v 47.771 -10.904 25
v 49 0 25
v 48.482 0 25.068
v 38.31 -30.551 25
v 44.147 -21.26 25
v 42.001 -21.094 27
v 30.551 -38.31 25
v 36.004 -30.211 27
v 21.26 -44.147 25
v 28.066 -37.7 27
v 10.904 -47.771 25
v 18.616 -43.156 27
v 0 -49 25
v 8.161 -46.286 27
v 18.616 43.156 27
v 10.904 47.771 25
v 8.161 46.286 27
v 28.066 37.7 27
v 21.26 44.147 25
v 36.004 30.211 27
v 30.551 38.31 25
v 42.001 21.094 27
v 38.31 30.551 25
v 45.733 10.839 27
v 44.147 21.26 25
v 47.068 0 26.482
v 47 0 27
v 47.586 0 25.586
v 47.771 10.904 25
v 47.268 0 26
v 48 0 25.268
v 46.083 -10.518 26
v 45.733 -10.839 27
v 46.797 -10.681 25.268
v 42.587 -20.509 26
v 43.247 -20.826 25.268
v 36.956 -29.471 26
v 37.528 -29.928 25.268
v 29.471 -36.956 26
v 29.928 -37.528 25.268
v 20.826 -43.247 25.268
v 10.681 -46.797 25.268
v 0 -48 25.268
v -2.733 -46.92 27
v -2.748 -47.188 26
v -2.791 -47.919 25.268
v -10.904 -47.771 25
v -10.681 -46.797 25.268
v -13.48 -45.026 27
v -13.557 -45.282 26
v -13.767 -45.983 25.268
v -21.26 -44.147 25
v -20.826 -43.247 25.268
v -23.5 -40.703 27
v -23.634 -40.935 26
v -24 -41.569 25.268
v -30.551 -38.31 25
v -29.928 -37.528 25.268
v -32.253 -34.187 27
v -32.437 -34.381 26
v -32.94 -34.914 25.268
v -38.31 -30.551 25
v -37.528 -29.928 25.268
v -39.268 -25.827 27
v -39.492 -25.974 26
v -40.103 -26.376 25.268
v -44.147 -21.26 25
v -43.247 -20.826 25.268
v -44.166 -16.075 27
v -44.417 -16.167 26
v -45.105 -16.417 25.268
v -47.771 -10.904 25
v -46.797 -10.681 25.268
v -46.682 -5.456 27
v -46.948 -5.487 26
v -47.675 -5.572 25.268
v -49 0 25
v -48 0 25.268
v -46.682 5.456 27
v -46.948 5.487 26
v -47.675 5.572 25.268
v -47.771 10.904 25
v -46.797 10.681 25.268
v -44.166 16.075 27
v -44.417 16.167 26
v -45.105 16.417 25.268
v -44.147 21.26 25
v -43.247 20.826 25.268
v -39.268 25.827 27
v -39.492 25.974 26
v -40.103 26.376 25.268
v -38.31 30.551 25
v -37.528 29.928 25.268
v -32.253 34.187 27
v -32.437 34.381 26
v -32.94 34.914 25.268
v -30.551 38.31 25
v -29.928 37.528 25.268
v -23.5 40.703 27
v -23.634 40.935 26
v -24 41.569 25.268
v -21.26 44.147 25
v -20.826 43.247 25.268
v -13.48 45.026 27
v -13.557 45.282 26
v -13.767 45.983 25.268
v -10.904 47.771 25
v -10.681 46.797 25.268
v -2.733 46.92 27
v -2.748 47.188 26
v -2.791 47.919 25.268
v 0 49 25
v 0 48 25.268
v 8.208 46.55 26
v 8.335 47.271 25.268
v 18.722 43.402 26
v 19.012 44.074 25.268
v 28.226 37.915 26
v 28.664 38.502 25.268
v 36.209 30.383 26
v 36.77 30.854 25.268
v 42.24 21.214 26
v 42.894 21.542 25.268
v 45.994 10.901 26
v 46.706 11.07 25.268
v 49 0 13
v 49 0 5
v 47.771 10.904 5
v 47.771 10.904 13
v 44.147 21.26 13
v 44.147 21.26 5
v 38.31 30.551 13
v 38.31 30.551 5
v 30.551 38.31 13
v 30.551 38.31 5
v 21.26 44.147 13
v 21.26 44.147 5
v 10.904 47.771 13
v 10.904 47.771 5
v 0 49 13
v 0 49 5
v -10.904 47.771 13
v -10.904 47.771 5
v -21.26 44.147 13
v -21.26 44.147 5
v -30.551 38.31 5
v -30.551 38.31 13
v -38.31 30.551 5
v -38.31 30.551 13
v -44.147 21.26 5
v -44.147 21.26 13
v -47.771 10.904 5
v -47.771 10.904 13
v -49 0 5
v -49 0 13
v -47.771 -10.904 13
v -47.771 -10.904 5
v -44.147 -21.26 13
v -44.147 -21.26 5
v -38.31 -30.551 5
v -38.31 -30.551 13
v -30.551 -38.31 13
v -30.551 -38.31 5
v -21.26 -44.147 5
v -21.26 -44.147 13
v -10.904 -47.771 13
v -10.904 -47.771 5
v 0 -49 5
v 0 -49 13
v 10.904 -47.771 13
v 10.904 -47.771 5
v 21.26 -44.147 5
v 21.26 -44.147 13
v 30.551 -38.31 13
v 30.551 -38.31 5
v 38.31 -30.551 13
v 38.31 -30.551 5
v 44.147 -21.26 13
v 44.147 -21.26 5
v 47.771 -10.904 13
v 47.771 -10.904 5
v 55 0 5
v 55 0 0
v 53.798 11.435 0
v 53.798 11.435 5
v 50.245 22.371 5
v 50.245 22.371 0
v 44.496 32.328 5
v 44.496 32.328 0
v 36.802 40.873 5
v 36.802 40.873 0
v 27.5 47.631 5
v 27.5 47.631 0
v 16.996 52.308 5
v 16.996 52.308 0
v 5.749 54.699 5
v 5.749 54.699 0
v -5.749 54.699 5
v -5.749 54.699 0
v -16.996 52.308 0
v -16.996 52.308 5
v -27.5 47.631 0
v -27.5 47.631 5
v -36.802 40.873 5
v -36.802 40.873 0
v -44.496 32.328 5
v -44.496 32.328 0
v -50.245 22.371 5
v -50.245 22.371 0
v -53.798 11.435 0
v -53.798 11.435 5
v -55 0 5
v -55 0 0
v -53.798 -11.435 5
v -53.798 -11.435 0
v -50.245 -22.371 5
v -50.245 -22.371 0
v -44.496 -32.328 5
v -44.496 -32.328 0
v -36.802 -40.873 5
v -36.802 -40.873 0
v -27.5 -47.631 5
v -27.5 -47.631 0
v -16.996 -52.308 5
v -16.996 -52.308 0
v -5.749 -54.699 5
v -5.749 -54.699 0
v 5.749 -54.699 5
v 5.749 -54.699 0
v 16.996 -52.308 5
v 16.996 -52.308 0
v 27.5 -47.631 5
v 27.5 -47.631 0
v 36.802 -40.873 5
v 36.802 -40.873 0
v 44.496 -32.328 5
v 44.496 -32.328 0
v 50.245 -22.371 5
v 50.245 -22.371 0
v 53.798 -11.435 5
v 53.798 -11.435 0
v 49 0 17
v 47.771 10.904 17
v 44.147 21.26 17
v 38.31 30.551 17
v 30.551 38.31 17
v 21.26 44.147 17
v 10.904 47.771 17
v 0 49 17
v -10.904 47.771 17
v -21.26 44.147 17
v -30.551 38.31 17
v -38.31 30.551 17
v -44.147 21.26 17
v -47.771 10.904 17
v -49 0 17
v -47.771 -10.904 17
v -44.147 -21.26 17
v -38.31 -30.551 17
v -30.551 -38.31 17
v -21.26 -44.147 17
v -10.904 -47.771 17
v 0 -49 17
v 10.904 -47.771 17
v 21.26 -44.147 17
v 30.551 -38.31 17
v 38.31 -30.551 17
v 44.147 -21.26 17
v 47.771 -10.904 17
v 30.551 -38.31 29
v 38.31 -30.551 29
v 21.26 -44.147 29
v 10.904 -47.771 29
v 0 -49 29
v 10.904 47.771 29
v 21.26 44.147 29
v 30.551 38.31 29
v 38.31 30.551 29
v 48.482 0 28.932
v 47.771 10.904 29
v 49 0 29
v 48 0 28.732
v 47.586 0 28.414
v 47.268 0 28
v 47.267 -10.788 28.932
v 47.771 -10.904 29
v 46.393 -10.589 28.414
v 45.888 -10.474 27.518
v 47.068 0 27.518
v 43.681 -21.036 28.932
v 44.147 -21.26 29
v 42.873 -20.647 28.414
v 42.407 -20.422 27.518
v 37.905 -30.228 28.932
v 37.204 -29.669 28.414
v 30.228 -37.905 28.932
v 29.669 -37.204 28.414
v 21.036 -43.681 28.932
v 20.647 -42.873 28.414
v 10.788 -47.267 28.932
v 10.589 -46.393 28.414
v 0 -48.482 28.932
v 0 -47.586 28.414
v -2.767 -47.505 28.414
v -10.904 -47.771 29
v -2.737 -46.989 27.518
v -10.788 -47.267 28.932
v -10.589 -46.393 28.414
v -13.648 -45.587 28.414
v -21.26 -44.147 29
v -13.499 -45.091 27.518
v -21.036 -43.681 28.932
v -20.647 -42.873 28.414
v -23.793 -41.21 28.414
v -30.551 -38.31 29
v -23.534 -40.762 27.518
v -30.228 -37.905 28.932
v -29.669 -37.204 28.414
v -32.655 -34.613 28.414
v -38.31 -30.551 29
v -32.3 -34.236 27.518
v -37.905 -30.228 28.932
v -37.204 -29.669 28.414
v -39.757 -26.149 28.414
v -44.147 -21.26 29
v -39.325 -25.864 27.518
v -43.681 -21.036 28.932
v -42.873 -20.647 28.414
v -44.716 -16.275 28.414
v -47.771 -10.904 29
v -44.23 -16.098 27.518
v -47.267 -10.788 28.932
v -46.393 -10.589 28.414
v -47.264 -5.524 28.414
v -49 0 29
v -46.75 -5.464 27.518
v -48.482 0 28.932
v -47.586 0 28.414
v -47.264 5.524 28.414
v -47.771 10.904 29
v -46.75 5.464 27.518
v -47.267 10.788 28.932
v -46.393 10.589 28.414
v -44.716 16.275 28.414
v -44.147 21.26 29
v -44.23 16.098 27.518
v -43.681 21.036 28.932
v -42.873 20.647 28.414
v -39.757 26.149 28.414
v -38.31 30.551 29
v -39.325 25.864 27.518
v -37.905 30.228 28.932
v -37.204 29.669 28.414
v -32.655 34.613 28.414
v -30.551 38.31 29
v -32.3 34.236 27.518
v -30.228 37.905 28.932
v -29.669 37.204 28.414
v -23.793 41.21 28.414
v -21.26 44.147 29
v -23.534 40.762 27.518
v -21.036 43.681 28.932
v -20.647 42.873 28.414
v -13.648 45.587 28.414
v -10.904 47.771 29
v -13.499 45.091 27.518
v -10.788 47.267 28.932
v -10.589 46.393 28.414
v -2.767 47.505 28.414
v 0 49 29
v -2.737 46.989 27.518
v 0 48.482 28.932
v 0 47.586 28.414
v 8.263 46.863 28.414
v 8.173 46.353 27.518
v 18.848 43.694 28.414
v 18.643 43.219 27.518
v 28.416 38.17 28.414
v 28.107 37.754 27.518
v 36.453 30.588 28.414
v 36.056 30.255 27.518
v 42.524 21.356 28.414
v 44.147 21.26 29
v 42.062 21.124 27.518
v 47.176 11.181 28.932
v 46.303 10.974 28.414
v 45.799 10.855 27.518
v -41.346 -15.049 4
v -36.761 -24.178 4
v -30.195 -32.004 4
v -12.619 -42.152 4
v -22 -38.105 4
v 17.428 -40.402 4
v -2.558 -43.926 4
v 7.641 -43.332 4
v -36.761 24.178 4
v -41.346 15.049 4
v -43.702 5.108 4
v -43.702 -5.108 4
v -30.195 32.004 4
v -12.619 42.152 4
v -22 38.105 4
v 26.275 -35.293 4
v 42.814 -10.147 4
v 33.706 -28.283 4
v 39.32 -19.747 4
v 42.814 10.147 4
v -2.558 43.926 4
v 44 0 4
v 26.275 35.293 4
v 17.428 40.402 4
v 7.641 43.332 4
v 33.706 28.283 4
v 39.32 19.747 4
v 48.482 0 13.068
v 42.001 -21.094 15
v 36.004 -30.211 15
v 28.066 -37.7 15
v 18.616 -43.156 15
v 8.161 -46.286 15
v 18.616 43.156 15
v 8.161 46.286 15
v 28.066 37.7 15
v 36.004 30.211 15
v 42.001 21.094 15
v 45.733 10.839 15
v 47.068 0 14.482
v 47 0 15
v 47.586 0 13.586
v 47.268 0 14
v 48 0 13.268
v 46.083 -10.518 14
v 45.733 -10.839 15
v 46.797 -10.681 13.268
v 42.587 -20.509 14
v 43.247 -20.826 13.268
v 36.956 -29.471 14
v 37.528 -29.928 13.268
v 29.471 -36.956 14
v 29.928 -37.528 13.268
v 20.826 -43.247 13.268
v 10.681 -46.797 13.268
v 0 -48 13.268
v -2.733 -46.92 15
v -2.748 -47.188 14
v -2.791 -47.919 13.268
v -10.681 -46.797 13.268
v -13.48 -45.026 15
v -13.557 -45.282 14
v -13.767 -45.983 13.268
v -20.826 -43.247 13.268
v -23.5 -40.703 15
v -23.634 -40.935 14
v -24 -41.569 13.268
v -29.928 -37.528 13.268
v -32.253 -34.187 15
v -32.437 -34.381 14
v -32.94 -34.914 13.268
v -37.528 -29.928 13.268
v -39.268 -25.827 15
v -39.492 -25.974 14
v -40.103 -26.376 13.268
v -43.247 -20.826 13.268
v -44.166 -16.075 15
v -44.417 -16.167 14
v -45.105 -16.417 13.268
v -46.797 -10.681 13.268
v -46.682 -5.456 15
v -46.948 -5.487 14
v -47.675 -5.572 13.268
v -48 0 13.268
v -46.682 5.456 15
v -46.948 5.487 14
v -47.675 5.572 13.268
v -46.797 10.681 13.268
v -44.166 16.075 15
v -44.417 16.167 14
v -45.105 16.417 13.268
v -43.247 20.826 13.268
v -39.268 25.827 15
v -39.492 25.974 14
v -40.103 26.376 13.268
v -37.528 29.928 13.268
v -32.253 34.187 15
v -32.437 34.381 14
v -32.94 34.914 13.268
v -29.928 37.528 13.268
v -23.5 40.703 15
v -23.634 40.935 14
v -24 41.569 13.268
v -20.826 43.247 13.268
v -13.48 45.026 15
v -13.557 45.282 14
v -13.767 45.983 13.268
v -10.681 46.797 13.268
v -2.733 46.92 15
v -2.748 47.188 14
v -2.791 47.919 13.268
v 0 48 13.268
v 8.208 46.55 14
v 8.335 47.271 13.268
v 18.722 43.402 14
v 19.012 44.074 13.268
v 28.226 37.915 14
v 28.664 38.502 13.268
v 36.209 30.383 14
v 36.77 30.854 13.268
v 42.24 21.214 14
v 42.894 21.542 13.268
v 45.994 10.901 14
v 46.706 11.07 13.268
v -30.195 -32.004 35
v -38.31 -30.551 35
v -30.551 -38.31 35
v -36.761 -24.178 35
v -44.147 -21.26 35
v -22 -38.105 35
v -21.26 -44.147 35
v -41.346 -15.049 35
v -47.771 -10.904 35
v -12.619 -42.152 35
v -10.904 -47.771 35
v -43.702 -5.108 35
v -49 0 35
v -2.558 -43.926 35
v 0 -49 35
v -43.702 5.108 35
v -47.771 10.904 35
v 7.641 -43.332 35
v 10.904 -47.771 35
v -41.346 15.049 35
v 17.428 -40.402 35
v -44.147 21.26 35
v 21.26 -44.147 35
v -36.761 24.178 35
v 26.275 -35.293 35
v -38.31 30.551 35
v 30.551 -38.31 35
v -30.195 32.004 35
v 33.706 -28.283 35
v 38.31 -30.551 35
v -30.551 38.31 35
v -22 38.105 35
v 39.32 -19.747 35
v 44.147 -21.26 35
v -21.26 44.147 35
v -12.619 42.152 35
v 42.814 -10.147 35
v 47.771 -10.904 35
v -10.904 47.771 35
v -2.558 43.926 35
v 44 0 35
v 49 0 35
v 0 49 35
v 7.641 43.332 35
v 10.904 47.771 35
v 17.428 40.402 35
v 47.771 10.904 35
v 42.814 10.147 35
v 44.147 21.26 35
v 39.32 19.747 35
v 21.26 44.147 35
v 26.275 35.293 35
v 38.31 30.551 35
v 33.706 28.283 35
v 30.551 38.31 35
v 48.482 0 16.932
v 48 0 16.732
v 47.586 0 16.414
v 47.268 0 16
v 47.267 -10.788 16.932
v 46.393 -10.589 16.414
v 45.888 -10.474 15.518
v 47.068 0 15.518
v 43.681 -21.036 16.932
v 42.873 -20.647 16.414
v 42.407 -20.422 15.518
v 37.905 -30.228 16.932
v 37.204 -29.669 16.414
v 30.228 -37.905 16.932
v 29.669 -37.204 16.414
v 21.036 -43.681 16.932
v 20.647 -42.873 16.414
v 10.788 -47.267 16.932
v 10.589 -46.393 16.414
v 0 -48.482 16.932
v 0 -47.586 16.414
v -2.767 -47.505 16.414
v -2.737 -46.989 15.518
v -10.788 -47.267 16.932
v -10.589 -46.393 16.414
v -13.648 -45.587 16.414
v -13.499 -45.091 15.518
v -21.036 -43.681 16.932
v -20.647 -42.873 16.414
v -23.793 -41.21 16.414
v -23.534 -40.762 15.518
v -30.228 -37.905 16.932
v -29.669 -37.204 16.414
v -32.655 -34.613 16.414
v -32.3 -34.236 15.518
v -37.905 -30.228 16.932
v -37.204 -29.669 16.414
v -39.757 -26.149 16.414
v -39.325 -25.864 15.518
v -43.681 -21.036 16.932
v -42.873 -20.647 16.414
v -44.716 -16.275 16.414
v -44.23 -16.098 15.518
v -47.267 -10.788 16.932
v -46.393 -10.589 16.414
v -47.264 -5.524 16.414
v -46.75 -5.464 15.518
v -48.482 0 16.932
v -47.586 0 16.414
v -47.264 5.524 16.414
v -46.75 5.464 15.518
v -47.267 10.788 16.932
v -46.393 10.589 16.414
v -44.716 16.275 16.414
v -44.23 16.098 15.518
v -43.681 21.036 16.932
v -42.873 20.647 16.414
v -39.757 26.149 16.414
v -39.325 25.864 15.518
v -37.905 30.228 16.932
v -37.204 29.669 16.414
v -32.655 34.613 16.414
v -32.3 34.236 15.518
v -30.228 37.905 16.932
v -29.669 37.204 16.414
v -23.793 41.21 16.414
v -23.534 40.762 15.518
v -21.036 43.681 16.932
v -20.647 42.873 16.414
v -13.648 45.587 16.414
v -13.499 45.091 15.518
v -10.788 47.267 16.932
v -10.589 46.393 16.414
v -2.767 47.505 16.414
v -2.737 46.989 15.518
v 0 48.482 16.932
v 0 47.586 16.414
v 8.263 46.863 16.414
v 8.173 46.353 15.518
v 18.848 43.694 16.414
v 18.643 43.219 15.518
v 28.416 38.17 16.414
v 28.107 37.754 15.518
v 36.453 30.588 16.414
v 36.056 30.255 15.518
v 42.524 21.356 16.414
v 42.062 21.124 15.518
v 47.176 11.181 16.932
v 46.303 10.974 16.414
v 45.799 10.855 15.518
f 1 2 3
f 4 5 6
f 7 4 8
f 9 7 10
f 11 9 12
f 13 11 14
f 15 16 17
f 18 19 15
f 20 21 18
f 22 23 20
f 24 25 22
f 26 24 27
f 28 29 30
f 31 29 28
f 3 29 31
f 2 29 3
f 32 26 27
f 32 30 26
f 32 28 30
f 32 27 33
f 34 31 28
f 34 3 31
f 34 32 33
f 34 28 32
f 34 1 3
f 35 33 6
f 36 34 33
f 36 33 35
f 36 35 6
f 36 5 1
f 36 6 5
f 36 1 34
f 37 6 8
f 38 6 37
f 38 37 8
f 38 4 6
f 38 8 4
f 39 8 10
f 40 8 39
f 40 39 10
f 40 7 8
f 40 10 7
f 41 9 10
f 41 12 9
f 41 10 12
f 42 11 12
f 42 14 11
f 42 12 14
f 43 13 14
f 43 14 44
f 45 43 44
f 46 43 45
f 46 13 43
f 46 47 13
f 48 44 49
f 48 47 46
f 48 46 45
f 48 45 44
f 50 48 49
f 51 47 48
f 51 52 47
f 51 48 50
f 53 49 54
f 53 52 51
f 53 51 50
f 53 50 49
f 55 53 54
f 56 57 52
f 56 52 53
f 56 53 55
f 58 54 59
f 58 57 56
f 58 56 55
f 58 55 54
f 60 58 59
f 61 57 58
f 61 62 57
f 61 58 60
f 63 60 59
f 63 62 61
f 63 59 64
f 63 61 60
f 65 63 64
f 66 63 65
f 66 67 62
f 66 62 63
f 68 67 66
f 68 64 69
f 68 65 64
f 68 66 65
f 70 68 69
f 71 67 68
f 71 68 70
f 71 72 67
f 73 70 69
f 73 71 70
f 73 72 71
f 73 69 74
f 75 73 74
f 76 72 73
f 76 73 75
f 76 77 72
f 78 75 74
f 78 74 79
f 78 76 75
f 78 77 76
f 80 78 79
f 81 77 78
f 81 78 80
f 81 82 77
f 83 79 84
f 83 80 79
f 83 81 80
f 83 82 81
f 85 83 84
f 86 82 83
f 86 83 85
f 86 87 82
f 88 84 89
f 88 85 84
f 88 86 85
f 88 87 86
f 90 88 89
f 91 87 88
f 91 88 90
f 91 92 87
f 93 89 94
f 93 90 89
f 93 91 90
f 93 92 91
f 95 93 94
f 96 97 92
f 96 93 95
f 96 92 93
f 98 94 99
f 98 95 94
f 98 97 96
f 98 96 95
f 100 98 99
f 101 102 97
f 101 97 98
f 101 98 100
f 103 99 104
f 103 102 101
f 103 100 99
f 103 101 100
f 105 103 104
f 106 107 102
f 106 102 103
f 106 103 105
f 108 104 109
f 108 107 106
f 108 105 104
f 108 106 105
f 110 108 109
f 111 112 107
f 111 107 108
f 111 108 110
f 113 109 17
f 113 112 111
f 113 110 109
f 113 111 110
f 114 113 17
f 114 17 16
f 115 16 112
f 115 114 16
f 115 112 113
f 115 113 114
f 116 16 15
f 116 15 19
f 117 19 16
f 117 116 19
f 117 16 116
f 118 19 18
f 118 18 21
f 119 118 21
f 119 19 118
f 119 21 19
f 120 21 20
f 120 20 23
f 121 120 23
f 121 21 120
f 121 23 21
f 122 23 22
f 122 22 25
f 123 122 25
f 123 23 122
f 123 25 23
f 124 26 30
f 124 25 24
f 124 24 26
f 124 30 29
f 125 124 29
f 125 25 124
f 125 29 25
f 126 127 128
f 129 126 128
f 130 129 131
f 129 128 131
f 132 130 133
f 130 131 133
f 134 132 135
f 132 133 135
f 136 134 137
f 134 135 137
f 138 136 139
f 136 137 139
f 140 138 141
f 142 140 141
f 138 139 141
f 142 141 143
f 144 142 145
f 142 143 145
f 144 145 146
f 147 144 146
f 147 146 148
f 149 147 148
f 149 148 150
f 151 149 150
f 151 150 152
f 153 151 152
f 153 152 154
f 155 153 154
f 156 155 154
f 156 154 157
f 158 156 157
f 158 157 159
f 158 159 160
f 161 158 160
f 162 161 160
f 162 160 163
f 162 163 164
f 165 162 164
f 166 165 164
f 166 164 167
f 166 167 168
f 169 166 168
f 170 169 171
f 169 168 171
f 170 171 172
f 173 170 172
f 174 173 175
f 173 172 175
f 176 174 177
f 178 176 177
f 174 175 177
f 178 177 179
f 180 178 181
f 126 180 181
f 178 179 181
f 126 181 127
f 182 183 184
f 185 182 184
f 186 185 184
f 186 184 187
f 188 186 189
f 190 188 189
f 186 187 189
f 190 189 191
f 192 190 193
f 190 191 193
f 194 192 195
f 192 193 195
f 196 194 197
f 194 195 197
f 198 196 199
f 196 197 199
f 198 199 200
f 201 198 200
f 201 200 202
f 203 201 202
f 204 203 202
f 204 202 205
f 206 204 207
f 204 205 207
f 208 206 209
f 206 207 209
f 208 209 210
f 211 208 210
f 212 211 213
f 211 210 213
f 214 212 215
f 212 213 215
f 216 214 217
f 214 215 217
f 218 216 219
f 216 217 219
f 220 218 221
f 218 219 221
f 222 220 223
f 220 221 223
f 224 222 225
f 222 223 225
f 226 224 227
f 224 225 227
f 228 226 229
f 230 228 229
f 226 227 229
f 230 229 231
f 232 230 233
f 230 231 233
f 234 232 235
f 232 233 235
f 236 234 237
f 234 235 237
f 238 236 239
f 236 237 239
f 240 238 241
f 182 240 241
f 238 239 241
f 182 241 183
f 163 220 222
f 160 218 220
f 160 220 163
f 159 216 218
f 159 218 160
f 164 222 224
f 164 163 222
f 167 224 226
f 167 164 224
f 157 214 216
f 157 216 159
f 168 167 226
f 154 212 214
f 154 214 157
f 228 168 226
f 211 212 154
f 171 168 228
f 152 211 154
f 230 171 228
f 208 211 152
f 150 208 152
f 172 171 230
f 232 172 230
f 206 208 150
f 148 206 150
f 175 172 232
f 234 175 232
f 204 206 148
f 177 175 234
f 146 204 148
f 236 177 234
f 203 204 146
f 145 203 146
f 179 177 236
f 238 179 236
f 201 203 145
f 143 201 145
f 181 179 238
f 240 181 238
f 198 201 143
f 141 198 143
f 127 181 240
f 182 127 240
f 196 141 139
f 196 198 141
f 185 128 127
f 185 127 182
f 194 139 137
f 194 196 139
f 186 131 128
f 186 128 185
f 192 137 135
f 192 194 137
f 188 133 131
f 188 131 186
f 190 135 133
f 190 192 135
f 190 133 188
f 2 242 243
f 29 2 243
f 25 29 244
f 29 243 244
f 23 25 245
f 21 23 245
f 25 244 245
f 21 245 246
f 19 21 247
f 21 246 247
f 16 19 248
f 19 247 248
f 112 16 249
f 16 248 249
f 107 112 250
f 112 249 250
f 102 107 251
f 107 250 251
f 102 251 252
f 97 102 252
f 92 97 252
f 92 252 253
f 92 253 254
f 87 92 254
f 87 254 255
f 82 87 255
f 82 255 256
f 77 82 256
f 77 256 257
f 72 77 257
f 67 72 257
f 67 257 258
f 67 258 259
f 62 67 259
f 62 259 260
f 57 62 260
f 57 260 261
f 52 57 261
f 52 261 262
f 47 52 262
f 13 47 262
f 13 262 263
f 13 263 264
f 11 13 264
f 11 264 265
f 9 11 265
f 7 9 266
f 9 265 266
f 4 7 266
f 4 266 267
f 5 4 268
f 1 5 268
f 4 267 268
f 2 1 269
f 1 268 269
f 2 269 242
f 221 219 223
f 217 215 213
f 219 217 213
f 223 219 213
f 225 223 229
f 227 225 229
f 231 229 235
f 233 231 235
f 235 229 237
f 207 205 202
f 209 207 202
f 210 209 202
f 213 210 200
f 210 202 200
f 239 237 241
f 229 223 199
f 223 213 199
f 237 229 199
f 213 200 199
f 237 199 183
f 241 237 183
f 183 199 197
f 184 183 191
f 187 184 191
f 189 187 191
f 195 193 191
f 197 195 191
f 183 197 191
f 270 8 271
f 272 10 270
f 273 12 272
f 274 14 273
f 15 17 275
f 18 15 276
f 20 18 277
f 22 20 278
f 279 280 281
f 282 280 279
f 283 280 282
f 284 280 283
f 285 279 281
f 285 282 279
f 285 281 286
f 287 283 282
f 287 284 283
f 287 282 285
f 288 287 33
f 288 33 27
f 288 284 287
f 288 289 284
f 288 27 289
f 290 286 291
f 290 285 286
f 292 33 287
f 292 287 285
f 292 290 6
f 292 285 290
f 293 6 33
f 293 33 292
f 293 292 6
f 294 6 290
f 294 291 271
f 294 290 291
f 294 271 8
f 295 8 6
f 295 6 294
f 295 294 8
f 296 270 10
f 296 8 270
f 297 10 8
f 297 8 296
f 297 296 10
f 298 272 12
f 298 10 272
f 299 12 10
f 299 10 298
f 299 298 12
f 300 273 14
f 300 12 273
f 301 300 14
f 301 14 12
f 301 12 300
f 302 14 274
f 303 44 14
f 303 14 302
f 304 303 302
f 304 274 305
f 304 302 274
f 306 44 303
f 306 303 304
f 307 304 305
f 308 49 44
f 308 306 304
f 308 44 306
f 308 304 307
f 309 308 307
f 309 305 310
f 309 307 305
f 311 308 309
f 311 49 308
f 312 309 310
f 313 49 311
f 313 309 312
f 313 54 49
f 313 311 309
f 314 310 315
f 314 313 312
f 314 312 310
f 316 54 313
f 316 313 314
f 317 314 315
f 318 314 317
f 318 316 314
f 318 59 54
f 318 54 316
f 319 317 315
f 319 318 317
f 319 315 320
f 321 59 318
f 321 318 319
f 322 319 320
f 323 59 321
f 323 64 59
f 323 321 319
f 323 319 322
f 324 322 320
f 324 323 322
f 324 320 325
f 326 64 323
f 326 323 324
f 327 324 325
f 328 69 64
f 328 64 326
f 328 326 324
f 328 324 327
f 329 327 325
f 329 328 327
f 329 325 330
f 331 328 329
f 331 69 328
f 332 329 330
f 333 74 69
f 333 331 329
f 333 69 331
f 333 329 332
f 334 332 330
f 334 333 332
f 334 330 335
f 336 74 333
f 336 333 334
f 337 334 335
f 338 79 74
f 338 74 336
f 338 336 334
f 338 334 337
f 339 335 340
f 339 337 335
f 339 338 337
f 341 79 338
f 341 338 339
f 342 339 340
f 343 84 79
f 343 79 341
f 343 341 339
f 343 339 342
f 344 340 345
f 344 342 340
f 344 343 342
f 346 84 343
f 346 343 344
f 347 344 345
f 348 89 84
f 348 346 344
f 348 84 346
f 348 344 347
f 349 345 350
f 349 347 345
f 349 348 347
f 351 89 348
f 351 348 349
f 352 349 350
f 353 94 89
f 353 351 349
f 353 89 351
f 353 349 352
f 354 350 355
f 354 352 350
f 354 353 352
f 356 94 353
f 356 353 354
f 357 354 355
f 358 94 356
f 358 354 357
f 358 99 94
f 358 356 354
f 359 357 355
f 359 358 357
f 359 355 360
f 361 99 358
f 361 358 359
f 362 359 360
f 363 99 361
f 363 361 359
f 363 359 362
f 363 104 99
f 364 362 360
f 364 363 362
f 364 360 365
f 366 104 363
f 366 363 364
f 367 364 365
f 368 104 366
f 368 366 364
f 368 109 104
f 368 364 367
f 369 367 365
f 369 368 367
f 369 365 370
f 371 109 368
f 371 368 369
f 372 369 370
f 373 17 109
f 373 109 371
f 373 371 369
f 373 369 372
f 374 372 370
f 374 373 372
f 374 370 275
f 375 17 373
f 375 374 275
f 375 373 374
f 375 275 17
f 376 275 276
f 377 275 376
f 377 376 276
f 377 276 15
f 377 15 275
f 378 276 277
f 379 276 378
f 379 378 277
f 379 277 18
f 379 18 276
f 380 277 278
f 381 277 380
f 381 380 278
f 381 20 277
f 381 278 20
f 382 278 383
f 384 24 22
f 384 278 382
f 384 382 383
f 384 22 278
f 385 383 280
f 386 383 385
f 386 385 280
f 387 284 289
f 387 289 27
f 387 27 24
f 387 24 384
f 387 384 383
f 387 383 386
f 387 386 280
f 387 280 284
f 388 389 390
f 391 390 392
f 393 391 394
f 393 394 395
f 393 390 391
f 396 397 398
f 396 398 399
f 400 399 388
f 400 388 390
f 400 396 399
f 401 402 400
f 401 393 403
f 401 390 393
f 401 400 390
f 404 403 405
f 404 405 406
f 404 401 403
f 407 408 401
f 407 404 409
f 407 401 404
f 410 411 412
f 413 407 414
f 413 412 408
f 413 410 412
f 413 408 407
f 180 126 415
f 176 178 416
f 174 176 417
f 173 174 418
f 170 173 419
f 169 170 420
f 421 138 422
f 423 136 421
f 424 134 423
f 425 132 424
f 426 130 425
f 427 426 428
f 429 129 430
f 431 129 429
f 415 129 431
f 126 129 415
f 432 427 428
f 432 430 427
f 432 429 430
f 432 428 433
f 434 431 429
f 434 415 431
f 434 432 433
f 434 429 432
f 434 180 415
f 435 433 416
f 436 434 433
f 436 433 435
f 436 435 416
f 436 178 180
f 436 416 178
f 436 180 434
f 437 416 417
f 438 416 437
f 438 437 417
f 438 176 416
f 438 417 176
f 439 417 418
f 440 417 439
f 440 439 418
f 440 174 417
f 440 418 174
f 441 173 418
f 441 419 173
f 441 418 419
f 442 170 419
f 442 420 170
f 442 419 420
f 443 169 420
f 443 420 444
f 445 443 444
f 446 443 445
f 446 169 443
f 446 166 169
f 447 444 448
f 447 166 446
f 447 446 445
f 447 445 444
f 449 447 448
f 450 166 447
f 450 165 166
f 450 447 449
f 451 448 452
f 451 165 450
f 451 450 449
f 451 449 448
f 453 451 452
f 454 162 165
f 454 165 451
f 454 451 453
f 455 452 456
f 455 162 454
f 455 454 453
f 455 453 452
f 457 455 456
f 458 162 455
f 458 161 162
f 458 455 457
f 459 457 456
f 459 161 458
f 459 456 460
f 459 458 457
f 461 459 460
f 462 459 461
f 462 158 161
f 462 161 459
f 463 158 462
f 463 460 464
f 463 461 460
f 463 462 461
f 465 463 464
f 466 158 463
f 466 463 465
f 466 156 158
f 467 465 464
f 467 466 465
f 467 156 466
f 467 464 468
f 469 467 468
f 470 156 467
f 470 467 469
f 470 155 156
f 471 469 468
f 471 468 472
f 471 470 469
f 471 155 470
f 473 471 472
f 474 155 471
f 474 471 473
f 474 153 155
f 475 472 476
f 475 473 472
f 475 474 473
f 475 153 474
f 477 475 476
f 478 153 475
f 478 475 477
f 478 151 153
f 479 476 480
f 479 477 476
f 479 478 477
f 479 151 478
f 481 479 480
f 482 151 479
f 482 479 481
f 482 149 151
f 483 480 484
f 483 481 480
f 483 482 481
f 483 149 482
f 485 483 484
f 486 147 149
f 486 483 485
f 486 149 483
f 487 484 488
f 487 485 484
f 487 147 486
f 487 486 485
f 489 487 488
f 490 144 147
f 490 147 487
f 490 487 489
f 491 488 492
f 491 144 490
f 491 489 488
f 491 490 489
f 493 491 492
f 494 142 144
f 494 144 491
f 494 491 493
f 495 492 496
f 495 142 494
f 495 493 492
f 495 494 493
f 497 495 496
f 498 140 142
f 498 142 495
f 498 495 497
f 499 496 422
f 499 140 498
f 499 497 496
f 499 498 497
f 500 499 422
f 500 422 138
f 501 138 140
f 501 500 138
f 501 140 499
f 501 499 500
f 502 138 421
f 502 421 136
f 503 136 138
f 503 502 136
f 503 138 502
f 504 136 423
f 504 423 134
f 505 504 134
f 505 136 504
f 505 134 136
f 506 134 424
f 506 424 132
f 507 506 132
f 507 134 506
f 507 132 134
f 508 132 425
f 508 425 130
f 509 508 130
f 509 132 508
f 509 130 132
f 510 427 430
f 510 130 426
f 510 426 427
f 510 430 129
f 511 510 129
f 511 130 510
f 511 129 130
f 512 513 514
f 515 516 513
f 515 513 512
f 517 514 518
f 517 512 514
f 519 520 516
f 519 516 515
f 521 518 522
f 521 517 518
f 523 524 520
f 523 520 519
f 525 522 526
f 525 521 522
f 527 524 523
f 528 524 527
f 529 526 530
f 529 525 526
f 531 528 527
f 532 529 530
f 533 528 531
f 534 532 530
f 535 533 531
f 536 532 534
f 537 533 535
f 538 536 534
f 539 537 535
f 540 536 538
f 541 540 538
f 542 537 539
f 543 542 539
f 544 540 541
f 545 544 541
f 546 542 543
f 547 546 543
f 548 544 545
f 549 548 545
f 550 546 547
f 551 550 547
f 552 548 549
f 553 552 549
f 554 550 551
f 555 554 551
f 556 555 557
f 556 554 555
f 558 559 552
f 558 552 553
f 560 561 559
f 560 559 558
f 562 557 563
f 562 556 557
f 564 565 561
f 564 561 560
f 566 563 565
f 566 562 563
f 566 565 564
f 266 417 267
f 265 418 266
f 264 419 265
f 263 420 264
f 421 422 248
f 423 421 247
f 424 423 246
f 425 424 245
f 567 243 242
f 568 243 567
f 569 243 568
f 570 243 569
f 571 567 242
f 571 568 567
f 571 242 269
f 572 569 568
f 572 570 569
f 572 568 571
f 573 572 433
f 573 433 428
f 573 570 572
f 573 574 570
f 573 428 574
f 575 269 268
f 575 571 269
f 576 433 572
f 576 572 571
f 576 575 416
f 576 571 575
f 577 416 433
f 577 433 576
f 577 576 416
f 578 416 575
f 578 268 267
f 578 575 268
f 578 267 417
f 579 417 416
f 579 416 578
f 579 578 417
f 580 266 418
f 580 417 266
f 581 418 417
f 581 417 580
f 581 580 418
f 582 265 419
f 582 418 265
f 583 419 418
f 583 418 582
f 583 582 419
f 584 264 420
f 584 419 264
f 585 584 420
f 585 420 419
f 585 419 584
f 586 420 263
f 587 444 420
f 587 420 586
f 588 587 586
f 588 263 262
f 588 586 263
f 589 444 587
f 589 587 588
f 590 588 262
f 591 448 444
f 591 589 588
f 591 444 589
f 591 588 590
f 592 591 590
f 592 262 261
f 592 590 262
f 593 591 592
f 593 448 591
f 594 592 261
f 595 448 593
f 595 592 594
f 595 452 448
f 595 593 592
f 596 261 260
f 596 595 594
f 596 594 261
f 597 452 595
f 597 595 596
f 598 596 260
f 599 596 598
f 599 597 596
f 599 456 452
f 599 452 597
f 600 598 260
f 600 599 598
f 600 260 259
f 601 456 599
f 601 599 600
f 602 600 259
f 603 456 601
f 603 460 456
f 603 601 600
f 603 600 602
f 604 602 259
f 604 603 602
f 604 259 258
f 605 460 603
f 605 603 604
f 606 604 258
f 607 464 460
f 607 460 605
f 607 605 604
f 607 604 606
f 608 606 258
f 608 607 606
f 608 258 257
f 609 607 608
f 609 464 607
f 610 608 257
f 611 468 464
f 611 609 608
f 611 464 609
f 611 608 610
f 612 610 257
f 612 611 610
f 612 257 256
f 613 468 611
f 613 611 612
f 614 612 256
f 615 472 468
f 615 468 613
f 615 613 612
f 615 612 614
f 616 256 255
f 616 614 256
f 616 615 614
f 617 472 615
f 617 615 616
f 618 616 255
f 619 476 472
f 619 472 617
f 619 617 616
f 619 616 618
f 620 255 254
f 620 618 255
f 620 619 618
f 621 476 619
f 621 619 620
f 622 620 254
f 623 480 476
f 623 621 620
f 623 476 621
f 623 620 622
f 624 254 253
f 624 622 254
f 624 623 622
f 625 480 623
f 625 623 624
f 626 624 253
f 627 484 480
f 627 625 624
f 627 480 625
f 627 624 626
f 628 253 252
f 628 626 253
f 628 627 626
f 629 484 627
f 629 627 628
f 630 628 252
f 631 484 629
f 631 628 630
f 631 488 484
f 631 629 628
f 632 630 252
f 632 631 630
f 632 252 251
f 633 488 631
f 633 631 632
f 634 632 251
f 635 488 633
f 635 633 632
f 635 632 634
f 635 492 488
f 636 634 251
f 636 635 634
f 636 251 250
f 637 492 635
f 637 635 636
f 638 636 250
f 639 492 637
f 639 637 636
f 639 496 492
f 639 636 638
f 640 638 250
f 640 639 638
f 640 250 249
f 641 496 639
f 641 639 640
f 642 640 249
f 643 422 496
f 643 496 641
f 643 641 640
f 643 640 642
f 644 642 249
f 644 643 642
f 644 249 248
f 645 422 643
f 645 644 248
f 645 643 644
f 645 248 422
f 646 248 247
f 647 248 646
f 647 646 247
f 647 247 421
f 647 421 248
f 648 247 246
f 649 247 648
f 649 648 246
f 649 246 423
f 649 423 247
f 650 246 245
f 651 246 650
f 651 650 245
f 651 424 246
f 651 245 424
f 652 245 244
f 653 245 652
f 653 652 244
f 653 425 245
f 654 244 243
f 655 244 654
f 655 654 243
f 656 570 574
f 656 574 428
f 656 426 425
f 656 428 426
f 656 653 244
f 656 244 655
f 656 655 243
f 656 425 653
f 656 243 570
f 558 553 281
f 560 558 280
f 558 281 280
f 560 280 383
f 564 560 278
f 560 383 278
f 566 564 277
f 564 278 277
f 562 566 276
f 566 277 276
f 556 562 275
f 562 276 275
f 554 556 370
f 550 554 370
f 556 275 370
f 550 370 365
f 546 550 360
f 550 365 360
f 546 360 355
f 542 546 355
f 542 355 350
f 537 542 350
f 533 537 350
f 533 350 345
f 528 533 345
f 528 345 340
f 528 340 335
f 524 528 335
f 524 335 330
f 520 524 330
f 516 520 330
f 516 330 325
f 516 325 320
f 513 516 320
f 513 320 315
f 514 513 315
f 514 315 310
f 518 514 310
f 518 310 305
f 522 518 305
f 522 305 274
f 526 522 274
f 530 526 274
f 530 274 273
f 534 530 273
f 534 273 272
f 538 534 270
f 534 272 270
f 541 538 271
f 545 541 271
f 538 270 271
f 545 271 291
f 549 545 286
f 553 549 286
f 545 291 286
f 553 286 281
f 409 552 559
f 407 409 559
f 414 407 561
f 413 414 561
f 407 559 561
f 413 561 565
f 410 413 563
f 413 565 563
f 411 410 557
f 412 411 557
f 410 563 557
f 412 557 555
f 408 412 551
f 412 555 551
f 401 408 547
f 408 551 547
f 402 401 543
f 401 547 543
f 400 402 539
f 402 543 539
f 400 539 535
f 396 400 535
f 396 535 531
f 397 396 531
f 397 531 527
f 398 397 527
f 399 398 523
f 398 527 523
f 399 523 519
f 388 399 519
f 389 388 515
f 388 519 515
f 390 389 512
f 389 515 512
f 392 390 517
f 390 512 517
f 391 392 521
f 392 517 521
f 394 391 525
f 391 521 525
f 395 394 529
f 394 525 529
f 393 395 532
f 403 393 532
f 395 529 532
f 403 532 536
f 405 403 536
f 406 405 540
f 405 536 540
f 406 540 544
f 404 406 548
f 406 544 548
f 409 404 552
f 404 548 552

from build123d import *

# Parameters (mm, degrees)
CROQUIS1_R              = 55
SALIENTE_EXTRUIR1_DEPTH = 5
CROQUIS2_R              = 49
SALIENTE_EXTRUIR2_DEPTH = 30
CROQUIS3_R              = 2
CROQUIS4_R              = 44
CORTAR_EXTRUIR1_DEPTH   = 31


with BuildPart() as part:
    # Croquis1 → Saliente-Extruir1 (new body)
    with BuildSketch(Plane.XY):
        Circle(CROQUIS1_R)
    extrude(amount=SALIENTE_EXTRUIR1_DEPTH)

    # Croquis2 → Saliente-Extruir2 (add)
    with BuildSketch(Plane.XY.offset(5)):
        Circle(CROQUIS2_R)
    extrude(amount=SALIENTE_EXTRUIR2_DEPTH)

    # Croquis3 → Cortar-Revolución1 (revolve, cut)
    with BuildSketch(Plane(origin=(0, 0, 0), x_dir=(1, 0, 0), z_dir=(0, 1, 0)), mode=Mode.PRIVATE) as cortar_revoluci_n1_sk:
        with Locations((-49, -15)):
            Circle(CROQUIS3_R)
        with Locations((-49, -27)):
            Circle(CROQUIS3_R)
    revolve(cortar_revoluci_n1_sk.sketch.rotate(Axis((0, 0, 36.878025431), (0, 0, -1)), 180), axis=Axis((0, 0, 36.878025431), (0, 0, -1)), mode=Mode.SUBTRACT)

    # Croquis4 → Cortar-Extruir1 (cut)
    with BuildSketch(Plane.XY.offset(35)):
        Circle(CROQUIS4_R)
    extrude(amount=-CORTAR_EXTRUIR1_DEPTH, mode=Mode.SUBTRACT)


solid = part.part
